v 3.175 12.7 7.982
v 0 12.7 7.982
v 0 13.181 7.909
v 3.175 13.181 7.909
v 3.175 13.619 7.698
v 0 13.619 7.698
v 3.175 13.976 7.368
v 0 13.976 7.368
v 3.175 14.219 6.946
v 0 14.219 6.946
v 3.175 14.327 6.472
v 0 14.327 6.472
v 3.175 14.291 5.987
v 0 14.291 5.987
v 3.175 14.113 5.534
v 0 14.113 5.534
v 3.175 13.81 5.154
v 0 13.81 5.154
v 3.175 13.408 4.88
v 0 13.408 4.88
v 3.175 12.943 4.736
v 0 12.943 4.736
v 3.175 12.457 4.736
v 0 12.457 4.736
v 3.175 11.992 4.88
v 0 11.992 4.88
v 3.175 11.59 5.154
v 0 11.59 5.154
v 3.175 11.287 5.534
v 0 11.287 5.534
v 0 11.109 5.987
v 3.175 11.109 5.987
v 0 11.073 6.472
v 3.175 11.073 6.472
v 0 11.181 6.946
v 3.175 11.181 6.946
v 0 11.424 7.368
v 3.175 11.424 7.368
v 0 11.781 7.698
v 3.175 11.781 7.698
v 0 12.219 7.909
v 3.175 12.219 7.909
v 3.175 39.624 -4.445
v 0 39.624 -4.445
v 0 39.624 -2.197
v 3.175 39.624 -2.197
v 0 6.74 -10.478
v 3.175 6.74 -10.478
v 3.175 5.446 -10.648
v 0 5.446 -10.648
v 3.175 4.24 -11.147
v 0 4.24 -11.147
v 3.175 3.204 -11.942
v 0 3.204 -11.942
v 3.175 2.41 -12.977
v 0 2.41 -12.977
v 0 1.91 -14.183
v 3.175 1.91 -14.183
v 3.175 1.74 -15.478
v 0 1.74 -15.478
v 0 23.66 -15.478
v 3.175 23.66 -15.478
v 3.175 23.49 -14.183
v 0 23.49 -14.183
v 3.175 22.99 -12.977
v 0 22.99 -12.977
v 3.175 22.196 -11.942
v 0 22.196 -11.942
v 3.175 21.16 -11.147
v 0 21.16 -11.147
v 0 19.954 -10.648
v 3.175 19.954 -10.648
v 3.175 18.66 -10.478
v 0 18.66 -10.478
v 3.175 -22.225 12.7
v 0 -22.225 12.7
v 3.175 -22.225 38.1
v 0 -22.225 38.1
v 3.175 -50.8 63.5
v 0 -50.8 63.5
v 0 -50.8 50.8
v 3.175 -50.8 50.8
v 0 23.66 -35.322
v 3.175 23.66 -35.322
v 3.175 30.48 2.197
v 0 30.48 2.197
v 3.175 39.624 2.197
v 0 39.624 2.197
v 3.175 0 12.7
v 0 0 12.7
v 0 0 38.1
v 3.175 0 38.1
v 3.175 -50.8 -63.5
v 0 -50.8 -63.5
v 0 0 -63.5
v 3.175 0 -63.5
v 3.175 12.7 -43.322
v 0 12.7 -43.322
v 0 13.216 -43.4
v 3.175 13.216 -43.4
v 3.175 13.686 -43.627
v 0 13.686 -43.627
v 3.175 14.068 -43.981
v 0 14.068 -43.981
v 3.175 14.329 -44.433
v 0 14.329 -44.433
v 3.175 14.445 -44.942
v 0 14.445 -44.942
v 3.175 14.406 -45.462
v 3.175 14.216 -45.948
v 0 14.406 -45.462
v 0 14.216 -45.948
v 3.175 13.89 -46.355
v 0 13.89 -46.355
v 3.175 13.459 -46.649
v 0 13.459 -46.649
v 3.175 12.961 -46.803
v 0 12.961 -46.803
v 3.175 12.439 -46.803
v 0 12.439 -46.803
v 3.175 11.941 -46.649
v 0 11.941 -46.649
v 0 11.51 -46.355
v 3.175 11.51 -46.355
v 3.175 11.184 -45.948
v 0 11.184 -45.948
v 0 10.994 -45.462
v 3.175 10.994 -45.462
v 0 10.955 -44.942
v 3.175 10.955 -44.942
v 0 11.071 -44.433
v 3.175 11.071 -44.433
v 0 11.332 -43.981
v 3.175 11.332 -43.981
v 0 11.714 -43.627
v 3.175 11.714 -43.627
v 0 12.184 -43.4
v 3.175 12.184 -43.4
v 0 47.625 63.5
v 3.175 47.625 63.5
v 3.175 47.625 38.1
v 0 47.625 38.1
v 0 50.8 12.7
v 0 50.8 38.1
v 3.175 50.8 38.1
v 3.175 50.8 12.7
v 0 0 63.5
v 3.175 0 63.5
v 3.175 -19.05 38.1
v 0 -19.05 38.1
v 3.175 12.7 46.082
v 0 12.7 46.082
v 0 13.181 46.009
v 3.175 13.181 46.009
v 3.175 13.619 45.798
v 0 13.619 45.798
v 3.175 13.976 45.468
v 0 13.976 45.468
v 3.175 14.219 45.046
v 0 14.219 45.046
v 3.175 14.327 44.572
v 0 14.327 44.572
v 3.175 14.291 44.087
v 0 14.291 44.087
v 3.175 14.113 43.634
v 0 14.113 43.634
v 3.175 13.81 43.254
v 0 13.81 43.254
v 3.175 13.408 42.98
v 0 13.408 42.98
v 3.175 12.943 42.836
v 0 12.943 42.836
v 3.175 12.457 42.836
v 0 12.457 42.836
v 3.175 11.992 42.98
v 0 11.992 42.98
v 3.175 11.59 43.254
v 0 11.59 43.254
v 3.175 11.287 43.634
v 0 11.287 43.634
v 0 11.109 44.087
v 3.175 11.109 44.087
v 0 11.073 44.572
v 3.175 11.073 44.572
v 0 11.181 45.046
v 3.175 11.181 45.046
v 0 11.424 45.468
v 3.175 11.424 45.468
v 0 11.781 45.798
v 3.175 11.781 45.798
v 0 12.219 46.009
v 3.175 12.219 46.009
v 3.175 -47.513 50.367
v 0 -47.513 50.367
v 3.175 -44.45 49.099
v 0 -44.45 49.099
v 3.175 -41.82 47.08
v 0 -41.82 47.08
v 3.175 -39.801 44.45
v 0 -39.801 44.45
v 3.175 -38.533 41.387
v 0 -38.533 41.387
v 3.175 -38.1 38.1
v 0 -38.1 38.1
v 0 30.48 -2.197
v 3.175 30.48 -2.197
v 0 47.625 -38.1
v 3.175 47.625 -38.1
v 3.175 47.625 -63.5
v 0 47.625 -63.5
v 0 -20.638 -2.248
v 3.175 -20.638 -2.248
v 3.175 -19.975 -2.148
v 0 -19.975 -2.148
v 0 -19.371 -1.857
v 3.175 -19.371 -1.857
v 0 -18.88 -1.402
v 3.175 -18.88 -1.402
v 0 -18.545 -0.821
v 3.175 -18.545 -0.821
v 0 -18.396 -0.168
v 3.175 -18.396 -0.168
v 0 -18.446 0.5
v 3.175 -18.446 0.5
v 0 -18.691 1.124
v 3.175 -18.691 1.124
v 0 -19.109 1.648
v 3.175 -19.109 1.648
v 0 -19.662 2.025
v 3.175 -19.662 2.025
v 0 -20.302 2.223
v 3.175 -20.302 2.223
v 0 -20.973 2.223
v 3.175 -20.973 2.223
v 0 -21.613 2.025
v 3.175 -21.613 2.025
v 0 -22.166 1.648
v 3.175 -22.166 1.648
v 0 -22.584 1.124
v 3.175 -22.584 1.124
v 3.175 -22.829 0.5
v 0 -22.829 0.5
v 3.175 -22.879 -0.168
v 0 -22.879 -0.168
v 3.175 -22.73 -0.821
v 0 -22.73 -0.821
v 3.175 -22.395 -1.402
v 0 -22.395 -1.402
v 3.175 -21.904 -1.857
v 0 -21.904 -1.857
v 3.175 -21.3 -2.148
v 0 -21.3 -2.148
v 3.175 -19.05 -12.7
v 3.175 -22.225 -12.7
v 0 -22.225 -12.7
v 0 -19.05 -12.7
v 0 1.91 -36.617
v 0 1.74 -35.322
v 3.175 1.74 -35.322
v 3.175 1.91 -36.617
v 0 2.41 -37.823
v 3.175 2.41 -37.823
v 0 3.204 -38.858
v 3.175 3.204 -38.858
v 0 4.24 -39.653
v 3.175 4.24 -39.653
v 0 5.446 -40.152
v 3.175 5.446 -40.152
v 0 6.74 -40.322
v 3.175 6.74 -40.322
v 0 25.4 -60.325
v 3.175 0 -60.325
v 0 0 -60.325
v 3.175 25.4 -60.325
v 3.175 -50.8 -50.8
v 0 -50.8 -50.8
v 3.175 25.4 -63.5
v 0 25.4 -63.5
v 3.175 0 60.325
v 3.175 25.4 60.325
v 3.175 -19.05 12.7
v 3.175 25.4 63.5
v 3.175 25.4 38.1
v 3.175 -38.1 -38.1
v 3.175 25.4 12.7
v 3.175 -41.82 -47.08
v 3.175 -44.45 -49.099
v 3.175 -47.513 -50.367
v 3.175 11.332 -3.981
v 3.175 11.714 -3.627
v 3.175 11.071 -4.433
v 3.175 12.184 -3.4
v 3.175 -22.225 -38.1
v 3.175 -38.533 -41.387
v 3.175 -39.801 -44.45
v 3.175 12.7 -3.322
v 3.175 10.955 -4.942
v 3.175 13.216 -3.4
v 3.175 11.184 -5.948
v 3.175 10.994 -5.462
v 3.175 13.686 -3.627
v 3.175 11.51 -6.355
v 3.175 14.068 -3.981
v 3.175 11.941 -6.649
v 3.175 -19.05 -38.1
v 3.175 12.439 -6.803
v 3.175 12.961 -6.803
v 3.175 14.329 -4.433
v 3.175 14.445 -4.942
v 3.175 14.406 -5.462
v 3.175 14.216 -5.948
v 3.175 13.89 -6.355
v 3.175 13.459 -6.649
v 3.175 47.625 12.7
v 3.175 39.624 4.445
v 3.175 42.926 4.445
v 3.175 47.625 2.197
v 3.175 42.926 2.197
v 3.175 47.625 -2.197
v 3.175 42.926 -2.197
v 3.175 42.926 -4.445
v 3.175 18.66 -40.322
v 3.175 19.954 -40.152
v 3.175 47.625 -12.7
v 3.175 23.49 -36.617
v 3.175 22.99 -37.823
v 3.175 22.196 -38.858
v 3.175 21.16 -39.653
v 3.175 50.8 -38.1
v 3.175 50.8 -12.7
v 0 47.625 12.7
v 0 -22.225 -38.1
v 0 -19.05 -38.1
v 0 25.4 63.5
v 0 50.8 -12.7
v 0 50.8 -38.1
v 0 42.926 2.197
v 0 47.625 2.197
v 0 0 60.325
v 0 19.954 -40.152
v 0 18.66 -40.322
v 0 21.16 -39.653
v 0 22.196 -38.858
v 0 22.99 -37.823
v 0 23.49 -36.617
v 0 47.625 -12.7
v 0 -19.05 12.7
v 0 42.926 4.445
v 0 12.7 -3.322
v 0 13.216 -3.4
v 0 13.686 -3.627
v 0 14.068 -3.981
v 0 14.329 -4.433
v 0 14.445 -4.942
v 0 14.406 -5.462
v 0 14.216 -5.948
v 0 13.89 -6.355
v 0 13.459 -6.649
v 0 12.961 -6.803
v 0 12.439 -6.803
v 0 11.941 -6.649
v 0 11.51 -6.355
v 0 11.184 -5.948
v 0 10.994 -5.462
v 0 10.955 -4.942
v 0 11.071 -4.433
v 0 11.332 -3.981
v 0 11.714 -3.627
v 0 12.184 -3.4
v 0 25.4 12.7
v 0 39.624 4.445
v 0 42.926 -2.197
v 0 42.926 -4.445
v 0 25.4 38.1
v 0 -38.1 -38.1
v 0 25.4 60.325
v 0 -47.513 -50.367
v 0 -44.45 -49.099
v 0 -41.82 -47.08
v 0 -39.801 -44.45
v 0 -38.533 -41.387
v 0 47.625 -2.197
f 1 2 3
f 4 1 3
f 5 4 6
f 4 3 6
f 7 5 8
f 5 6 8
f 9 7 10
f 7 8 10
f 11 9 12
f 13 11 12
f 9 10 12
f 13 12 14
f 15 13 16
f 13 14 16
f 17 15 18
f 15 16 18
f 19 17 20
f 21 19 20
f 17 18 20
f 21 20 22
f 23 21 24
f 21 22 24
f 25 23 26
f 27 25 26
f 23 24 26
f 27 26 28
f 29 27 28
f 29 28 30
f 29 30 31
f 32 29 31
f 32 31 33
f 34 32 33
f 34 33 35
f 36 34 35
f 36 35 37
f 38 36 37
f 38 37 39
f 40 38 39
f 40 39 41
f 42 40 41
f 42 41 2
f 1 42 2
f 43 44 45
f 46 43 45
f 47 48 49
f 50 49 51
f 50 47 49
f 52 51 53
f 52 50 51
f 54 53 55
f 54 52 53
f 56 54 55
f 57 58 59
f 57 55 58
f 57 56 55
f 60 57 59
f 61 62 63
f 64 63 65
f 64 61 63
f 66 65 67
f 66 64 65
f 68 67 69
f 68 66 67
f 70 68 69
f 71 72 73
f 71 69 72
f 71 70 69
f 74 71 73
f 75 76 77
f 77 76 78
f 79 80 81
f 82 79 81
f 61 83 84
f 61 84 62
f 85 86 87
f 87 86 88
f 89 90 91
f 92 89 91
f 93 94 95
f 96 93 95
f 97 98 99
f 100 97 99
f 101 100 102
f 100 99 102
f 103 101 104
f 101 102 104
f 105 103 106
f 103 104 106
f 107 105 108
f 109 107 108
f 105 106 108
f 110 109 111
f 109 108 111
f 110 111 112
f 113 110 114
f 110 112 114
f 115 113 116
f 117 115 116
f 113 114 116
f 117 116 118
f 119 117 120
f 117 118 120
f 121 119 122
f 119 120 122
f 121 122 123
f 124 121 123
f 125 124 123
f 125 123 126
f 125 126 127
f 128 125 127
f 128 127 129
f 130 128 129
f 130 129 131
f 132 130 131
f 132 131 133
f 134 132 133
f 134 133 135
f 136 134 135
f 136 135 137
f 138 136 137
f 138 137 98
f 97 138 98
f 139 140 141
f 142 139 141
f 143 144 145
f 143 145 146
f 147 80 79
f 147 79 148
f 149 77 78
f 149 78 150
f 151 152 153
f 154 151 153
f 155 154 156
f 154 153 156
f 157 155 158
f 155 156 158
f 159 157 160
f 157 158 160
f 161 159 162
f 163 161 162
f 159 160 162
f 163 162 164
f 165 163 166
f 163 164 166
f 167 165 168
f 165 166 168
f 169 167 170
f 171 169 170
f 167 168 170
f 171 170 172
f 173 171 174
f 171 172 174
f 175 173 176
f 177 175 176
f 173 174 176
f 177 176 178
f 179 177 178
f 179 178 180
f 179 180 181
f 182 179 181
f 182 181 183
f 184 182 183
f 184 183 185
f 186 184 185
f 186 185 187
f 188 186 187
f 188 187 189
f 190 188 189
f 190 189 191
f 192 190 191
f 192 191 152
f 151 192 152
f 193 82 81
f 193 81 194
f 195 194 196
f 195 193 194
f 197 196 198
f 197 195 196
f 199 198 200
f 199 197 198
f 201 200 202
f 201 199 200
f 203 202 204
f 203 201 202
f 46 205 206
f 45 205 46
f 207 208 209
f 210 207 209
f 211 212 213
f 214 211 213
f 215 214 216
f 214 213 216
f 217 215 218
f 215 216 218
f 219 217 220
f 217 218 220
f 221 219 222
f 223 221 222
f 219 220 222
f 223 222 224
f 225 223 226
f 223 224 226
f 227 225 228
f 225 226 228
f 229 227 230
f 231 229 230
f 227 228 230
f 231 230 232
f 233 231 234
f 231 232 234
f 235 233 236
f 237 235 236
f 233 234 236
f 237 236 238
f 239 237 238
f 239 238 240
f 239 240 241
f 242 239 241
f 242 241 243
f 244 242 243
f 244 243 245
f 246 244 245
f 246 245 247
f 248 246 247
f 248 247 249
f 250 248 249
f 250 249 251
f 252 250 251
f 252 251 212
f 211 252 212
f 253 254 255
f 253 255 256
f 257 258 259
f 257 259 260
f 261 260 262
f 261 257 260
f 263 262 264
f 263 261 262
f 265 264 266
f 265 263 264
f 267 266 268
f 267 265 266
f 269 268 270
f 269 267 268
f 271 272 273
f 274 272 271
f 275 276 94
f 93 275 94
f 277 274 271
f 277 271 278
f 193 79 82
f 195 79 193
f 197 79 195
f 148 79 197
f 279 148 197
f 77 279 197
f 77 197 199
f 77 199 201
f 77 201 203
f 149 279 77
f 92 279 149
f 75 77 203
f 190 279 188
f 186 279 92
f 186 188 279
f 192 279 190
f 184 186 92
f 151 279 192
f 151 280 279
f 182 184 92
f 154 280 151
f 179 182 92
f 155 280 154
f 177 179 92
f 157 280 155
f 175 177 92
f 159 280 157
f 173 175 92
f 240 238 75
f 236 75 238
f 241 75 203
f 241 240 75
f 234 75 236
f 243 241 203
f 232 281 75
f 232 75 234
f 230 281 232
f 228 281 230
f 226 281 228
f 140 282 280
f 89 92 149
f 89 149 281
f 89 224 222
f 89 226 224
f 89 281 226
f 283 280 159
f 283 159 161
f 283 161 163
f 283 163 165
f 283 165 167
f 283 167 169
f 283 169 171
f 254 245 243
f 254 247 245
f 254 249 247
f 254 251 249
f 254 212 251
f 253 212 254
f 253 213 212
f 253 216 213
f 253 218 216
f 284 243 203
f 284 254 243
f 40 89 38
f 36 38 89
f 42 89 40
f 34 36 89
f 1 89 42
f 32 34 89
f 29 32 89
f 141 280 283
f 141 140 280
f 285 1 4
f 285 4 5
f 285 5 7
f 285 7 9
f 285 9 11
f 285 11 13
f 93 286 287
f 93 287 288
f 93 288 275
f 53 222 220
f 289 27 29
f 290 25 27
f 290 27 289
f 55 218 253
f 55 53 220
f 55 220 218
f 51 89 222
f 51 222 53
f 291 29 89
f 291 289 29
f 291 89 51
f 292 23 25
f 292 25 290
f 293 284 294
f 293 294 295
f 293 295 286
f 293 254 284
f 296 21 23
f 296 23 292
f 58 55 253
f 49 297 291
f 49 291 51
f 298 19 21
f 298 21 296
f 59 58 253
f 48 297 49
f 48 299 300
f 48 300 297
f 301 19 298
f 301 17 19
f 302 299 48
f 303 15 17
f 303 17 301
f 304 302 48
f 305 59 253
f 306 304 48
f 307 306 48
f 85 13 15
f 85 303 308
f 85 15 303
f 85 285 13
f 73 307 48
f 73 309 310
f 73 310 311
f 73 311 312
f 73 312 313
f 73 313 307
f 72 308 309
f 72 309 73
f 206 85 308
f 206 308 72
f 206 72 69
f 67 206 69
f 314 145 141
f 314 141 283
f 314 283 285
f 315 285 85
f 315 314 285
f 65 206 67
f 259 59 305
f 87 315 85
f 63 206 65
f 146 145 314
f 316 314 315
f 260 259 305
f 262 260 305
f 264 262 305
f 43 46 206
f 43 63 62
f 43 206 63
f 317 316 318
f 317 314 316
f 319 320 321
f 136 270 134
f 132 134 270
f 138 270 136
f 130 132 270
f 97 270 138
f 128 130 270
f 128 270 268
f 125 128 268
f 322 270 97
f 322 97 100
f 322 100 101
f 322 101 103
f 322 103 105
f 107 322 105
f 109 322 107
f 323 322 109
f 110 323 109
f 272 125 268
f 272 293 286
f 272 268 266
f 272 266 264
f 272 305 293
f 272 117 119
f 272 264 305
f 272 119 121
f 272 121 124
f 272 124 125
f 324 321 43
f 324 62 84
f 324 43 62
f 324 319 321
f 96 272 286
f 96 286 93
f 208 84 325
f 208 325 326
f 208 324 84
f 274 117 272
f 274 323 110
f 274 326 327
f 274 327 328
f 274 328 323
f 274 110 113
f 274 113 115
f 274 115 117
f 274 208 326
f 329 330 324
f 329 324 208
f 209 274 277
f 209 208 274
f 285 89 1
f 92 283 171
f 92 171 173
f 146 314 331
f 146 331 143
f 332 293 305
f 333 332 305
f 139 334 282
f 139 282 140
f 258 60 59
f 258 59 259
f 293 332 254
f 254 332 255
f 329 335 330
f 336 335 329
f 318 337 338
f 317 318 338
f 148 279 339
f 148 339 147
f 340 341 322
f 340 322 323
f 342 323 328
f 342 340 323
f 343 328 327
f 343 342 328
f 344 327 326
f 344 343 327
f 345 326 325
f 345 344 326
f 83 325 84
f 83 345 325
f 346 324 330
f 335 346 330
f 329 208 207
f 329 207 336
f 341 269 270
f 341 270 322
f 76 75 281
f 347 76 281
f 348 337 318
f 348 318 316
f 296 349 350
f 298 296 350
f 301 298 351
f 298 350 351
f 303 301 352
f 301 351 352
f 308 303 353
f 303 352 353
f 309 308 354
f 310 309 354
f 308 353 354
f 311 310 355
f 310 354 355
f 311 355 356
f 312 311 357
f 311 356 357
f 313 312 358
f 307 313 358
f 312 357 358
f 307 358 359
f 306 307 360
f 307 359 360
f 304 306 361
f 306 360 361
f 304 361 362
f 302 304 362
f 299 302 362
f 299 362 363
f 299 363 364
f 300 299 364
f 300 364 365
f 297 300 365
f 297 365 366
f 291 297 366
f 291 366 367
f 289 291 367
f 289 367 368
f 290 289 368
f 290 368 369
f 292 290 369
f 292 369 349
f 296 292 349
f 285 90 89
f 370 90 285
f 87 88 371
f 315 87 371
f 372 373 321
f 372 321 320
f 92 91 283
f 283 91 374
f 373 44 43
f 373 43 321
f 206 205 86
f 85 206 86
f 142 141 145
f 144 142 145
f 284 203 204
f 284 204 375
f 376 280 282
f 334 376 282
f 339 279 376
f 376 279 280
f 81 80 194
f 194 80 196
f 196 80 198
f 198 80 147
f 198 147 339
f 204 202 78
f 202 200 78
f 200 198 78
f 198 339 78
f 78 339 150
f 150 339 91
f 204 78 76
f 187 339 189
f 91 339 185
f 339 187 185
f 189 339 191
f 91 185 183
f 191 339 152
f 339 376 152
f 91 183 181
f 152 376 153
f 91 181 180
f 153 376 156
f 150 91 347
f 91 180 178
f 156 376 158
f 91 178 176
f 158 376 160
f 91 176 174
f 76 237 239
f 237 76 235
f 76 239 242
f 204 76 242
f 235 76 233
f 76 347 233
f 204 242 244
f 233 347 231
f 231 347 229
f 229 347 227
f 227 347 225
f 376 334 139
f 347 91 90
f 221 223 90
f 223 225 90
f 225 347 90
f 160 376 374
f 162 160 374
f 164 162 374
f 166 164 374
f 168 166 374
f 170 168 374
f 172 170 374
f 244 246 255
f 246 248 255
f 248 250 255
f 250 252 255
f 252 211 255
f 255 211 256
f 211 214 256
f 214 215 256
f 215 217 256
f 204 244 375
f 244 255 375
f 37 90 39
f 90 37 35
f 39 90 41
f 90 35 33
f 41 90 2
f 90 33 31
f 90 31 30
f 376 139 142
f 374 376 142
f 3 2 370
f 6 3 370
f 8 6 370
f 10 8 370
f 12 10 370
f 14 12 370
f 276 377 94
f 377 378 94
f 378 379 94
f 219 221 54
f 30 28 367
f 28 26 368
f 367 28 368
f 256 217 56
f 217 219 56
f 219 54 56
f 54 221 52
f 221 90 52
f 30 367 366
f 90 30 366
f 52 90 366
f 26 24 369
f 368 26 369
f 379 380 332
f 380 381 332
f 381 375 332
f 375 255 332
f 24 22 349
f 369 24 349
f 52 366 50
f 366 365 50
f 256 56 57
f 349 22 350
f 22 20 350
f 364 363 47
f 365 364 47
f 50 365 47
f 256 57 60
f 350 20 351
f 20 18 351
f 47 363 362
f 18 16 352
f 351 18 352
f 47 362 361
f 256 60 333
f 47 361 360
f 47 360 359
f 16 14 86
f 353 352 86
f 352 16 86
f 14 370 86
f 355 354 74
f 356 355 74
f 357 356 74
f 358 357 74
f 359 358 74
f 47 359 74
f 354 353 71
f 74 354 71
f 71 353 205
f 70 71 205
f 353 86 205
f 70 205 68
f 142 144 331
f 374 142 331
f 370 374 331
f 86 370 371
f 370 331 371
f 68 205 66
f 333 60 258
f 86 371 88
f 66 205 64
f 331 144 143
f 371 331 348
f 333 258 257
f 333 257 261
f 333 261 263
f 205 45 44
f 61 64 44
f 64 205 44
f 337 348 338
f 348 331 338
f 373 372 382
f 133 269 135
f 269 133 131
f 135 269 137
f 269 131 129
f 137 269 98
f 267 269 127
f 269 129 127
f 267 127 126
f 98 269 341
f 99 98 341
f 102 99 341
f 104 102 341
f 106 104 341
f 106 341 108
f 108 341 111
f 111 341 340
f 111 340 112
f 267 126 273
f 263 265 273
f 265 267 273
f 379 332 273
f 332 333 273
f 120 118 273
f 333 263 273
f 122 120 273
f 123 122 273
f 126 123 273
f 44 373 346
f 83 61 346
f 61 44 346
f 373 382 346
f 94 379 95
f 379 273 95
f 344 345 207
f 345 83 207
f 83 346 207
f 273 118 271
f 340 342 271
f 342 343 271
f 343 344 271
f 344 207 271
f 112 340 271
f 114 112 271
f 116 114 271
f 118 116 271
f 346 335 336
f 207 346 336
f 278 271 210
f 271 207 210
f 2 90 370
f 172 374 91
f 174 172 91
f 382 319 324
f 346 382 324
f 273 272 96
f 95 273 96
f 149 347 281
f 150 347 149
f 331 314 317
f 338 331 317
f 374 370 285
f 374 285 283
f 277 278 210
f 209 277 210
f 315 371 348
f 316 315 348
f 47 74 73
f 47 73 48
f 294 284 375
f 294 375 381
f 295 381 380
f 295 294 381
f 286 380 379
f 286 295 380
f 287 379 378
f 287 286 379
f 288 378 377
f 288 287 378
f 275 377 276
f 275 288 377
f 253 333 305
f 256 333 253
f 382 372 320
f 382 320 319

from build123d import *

# Parameters (mm, degrees)
SKETCH1_W                 = 127
SKETCH1_H                 = 101.6
BOSS_EXTRUDE1_DEPTH       = 3.175
SKETCH2_W                 = 25.4
SKETCH2_H                 = 3.175
CUT_EXTRUDE1_DEPTH        = 6.35
LPATTERN1_COUNT           = 3
LPATTERN1_PITCH           = 50.8
CUT_EXTRUDE4_DEPTH        = 6.35
SKETCH8_W                 = 3.175
SKETCH8_H                 = 25.4
CUT_EXTRUDE6_DEPTH        = 6.35
SKETCH9_W                 = 25.4
SKETCH9_H                 = 3.175
CUT_EXTRUDE7_DEPTH        = 6.35
LPATTERN6_COUNT           = 2
LPATTERN6_PITCH           = 50.8
SKETCH16_W                = 4.3942
SKETCH16_H                = 17.145
SKETCH16_W_2              = 8.89
SKETCH16_H_2              = 3.302
CUT_EXTRUDE14_DEPTH       = 6.35
F_8_CLEARANCE_HOLE1_D     = 4.4958
F_8_CLEARANCE_HOLE1_DEPTH = 10.16
F_8_CLEARANCE_HOLE1_TIP   = 1.350674586
SKETCH20_R                = 1.75
CUT_EXTRUDE16_DEPTH       = 7.62
SKETCH25_W                = 25.4
SKETCH25_H                = 25.4
CUT_EXTRUDE20_DEPTH       = 7.62
F_4_CLEARANCE_HOLE1_D     = 3.2639
F_4_CLEARANCE_HOLE1_DEPTH = 10.16
F_4_CLEARANCE_HOLE1_TIP   = 0.980574487


with BuildPart() as part:
    # Sketch1 → Boss-Extrude1 (new body)
    with BuildSketch(Plane(origin=(0, 0, 0), x_dir=(0, 0, -1), z_dir=(1, 0, 0))):
        Rectangle(SKETCH1_W, SKETCH1_H)
    extrude(amount=BOSS_EXTRUDE1_DEPTH)

    # Sketch2 → Cut-Extrude1 (cut)
    with BuildSketch(Plane(origin=(3.175, 0, 0), x_dir=(0, 0, -1), z_dir=(1, 0, 0))):
        with Locations((-50.8, 49.2125)):
            Rectangle(SKETCH2_W, SKETCH2_H)
    cut_extrude1 = extrude(amount=-CUT_EXTRUDE1_DEPTH, mode=Mode.SUBTRACT)

    # LPattern1: Cut-Extrude1 ×3
    with Locations(*[(0, 0, -i * LPATTERN1_PITCH) for i in range(1, LPATTERN1_COUNT)]):
        add(cut_extrude1, mode=Mode.SUBTRACT)

    # Sketch5 → Cut-Extrude4 (cut)
    with BuildSketch(Plane(origin=(3.175, 0, 0), x_dir=(0, 0, -1), z_dir=(1, 0, 0))):
        with BuildLine():
            Line((-38.1, -38.1), (38.1, -38.1))
            ThreePointArc((38.1, -38.1), (50.8, -50.8), (38.1, -63.5))
            Line((38.1, -63.5), (-38.1, -63.5))
            ThreePointArc((-38.1, -63.5), (-50.8, -50.8), (-38.1, -38.1))
        make_face()
    extrude(amount=-CUT_EXTRUDE4_DEPTH, mode=Mode.SUBTRACT)

    # Sketch8 → Cut-Extrude6 (cut)
    with BuildSketch(Plane(origin=(3.175, 0, 0), x_dir=(0, 0, -1), z_dir=(1, 0, 0))):
        with Locations((61.9125, 12.7)):
            Rectangle(SKETCH8_W, SKETCH8_H)
    cut_extrude6 = extrude(amount=-CUT_EXTRUDE6_DEPTH, mode=Mode.SUBTRACT)

    # Sketch9 → Cut-Extrude7 (cut)
    with BuildSketch(Plane.ZY):
        with Locations((-25.4, -20.6375)):
            Rectangle(SKETCH9_W, SKETCH9_H)
    cut_extrude7 = extrude(amount=-CUT_EXTRUDE7_DEPTH, mode=Mode.SUBTRACT)

    # LPattern6: Cut-Extrude7 ×2
    with Locations(*[(0, 0, i * LPATTERN6_PITCH) for i in range(1, LPATTERN6_COUNT)]):
        add(cut_extrude7, mode=Mode.SUBTRACT)

    # Sketch16 → Cut-Extrude14 (cut)
    with BuildSketch(Plane.ZY):
        with Locations((0, 39.0525)):
            Rectangle(SKETCH16_W, SKETCH16_H)
        with Locations((0, 41.275)):
            Rectangle(SKETCH16_W_2, SKETCH16_H_2)
    extrude(amount=-CUT_EXTRUDE14_DEPTH, mode=Mode.SUBTRACT)

    # #8 Clearance Hole1
    with Locations(Plane.ZY):
        with Locations((0, -20.6375)):
            Hole(F_8_CLEARANCE_HOLE1_D / 2, depth=F_8_CLEARANCE_HOLE1_DEPTH)
            with Locations((0, 0, -(F_8_CLEARANCE_HOLE1_DEPTH + F_8_CLEARANCE_HOLE1_TIP / 2))):  # 118° drill point
                Cone(0, F_8_CLEARANCE_HOLE1_D / 2, F_8_CLEARANCE_HOLE1_TIP, mode=Mode.SUBTRACT)

    # Sketch20 → Cut-Extrude16 (cut)
    with BuildSketch(Plane.ZY):
        with Locations((-45.0725, 12.7)):
            Circle(SKETCH20_R)
        with Locations((-5.0725, 12.7)):
            Circle(SKETCH20_R)
        with BuildLine():
            Line((-35.3225, 23.6601), (-15.4775, 23.6601))
            ThreePointArc((-15.4775, 23.6601), (-11.941966094, 22.195633906), (-10.4775, 18.6601))
            Line((-10.4775, 18.6601), (-10.4775, 6.7399))
            ThreePointArc((-10.4775, 6.7399), (-11.941966094, 3.204366094), (-15.4775, 1.7399))
            Line((-15.4775, 1.7399), (-35.3225, 1.7399))
            ThreePointArc((-35.3225, 1.7399), (-38.858033906, 3.204366094), (-40.3225, 6.7399))
            Line((-40.3225, 6.7399), (-40.3225, 18.6601))
            ThreePointArc((-40.3225, 18.6601), (-38.858033906, 22.195633906), (-35.3225, 23.6601))
        make_face()
    extrude(amount=-CUT_EXTRUDE16_DEPTH, mode=Mode.SUBTRACT)

    # Sketch25 → Cut-Extrude20 (cut)
    with BuildSketch(Plane.ZY):
        with Locations((25.4, 12.7)):
            Rectangle(SKETCH25_W, SKETCH25_H)
    extrude(amount=-CUT_EXTRUDE20_DEPTH, mode=Mode.SUBTRACT)

    # Mirror3: Cut-Extrude6 across plane
    add(cut_extrude6.mirror(Plane.XY), mode=Mode.SUBTRACT)

    # #4 Clearance Hole1
    with Locations(Plane(origin=(3.175, 0, 0), x_dir=(0, 0, -1), z_dir=(1, 0, 0))):
        with Locations((-44.45, 12.7), (-6.35, 12.7)):
            Hole(F_4_CLEARANCE_HOLE1_D / 2, depth=F_4_CLEARANCE_HOLE1_DEPTH)
            with Locations((0, 0, -(F_4_CLEARANCE_HOLE1_DEPTH + F_4_CLEARANCE_HOLE1_TIP / 2))):  # 118° drill point
                Cone(0, F_4_CLEARANCE_HOLE1_D / 2, F_4_CLEARANCE_HOLE1_TIP, mode=Mode.SUBTRACT)


solid = part.part
